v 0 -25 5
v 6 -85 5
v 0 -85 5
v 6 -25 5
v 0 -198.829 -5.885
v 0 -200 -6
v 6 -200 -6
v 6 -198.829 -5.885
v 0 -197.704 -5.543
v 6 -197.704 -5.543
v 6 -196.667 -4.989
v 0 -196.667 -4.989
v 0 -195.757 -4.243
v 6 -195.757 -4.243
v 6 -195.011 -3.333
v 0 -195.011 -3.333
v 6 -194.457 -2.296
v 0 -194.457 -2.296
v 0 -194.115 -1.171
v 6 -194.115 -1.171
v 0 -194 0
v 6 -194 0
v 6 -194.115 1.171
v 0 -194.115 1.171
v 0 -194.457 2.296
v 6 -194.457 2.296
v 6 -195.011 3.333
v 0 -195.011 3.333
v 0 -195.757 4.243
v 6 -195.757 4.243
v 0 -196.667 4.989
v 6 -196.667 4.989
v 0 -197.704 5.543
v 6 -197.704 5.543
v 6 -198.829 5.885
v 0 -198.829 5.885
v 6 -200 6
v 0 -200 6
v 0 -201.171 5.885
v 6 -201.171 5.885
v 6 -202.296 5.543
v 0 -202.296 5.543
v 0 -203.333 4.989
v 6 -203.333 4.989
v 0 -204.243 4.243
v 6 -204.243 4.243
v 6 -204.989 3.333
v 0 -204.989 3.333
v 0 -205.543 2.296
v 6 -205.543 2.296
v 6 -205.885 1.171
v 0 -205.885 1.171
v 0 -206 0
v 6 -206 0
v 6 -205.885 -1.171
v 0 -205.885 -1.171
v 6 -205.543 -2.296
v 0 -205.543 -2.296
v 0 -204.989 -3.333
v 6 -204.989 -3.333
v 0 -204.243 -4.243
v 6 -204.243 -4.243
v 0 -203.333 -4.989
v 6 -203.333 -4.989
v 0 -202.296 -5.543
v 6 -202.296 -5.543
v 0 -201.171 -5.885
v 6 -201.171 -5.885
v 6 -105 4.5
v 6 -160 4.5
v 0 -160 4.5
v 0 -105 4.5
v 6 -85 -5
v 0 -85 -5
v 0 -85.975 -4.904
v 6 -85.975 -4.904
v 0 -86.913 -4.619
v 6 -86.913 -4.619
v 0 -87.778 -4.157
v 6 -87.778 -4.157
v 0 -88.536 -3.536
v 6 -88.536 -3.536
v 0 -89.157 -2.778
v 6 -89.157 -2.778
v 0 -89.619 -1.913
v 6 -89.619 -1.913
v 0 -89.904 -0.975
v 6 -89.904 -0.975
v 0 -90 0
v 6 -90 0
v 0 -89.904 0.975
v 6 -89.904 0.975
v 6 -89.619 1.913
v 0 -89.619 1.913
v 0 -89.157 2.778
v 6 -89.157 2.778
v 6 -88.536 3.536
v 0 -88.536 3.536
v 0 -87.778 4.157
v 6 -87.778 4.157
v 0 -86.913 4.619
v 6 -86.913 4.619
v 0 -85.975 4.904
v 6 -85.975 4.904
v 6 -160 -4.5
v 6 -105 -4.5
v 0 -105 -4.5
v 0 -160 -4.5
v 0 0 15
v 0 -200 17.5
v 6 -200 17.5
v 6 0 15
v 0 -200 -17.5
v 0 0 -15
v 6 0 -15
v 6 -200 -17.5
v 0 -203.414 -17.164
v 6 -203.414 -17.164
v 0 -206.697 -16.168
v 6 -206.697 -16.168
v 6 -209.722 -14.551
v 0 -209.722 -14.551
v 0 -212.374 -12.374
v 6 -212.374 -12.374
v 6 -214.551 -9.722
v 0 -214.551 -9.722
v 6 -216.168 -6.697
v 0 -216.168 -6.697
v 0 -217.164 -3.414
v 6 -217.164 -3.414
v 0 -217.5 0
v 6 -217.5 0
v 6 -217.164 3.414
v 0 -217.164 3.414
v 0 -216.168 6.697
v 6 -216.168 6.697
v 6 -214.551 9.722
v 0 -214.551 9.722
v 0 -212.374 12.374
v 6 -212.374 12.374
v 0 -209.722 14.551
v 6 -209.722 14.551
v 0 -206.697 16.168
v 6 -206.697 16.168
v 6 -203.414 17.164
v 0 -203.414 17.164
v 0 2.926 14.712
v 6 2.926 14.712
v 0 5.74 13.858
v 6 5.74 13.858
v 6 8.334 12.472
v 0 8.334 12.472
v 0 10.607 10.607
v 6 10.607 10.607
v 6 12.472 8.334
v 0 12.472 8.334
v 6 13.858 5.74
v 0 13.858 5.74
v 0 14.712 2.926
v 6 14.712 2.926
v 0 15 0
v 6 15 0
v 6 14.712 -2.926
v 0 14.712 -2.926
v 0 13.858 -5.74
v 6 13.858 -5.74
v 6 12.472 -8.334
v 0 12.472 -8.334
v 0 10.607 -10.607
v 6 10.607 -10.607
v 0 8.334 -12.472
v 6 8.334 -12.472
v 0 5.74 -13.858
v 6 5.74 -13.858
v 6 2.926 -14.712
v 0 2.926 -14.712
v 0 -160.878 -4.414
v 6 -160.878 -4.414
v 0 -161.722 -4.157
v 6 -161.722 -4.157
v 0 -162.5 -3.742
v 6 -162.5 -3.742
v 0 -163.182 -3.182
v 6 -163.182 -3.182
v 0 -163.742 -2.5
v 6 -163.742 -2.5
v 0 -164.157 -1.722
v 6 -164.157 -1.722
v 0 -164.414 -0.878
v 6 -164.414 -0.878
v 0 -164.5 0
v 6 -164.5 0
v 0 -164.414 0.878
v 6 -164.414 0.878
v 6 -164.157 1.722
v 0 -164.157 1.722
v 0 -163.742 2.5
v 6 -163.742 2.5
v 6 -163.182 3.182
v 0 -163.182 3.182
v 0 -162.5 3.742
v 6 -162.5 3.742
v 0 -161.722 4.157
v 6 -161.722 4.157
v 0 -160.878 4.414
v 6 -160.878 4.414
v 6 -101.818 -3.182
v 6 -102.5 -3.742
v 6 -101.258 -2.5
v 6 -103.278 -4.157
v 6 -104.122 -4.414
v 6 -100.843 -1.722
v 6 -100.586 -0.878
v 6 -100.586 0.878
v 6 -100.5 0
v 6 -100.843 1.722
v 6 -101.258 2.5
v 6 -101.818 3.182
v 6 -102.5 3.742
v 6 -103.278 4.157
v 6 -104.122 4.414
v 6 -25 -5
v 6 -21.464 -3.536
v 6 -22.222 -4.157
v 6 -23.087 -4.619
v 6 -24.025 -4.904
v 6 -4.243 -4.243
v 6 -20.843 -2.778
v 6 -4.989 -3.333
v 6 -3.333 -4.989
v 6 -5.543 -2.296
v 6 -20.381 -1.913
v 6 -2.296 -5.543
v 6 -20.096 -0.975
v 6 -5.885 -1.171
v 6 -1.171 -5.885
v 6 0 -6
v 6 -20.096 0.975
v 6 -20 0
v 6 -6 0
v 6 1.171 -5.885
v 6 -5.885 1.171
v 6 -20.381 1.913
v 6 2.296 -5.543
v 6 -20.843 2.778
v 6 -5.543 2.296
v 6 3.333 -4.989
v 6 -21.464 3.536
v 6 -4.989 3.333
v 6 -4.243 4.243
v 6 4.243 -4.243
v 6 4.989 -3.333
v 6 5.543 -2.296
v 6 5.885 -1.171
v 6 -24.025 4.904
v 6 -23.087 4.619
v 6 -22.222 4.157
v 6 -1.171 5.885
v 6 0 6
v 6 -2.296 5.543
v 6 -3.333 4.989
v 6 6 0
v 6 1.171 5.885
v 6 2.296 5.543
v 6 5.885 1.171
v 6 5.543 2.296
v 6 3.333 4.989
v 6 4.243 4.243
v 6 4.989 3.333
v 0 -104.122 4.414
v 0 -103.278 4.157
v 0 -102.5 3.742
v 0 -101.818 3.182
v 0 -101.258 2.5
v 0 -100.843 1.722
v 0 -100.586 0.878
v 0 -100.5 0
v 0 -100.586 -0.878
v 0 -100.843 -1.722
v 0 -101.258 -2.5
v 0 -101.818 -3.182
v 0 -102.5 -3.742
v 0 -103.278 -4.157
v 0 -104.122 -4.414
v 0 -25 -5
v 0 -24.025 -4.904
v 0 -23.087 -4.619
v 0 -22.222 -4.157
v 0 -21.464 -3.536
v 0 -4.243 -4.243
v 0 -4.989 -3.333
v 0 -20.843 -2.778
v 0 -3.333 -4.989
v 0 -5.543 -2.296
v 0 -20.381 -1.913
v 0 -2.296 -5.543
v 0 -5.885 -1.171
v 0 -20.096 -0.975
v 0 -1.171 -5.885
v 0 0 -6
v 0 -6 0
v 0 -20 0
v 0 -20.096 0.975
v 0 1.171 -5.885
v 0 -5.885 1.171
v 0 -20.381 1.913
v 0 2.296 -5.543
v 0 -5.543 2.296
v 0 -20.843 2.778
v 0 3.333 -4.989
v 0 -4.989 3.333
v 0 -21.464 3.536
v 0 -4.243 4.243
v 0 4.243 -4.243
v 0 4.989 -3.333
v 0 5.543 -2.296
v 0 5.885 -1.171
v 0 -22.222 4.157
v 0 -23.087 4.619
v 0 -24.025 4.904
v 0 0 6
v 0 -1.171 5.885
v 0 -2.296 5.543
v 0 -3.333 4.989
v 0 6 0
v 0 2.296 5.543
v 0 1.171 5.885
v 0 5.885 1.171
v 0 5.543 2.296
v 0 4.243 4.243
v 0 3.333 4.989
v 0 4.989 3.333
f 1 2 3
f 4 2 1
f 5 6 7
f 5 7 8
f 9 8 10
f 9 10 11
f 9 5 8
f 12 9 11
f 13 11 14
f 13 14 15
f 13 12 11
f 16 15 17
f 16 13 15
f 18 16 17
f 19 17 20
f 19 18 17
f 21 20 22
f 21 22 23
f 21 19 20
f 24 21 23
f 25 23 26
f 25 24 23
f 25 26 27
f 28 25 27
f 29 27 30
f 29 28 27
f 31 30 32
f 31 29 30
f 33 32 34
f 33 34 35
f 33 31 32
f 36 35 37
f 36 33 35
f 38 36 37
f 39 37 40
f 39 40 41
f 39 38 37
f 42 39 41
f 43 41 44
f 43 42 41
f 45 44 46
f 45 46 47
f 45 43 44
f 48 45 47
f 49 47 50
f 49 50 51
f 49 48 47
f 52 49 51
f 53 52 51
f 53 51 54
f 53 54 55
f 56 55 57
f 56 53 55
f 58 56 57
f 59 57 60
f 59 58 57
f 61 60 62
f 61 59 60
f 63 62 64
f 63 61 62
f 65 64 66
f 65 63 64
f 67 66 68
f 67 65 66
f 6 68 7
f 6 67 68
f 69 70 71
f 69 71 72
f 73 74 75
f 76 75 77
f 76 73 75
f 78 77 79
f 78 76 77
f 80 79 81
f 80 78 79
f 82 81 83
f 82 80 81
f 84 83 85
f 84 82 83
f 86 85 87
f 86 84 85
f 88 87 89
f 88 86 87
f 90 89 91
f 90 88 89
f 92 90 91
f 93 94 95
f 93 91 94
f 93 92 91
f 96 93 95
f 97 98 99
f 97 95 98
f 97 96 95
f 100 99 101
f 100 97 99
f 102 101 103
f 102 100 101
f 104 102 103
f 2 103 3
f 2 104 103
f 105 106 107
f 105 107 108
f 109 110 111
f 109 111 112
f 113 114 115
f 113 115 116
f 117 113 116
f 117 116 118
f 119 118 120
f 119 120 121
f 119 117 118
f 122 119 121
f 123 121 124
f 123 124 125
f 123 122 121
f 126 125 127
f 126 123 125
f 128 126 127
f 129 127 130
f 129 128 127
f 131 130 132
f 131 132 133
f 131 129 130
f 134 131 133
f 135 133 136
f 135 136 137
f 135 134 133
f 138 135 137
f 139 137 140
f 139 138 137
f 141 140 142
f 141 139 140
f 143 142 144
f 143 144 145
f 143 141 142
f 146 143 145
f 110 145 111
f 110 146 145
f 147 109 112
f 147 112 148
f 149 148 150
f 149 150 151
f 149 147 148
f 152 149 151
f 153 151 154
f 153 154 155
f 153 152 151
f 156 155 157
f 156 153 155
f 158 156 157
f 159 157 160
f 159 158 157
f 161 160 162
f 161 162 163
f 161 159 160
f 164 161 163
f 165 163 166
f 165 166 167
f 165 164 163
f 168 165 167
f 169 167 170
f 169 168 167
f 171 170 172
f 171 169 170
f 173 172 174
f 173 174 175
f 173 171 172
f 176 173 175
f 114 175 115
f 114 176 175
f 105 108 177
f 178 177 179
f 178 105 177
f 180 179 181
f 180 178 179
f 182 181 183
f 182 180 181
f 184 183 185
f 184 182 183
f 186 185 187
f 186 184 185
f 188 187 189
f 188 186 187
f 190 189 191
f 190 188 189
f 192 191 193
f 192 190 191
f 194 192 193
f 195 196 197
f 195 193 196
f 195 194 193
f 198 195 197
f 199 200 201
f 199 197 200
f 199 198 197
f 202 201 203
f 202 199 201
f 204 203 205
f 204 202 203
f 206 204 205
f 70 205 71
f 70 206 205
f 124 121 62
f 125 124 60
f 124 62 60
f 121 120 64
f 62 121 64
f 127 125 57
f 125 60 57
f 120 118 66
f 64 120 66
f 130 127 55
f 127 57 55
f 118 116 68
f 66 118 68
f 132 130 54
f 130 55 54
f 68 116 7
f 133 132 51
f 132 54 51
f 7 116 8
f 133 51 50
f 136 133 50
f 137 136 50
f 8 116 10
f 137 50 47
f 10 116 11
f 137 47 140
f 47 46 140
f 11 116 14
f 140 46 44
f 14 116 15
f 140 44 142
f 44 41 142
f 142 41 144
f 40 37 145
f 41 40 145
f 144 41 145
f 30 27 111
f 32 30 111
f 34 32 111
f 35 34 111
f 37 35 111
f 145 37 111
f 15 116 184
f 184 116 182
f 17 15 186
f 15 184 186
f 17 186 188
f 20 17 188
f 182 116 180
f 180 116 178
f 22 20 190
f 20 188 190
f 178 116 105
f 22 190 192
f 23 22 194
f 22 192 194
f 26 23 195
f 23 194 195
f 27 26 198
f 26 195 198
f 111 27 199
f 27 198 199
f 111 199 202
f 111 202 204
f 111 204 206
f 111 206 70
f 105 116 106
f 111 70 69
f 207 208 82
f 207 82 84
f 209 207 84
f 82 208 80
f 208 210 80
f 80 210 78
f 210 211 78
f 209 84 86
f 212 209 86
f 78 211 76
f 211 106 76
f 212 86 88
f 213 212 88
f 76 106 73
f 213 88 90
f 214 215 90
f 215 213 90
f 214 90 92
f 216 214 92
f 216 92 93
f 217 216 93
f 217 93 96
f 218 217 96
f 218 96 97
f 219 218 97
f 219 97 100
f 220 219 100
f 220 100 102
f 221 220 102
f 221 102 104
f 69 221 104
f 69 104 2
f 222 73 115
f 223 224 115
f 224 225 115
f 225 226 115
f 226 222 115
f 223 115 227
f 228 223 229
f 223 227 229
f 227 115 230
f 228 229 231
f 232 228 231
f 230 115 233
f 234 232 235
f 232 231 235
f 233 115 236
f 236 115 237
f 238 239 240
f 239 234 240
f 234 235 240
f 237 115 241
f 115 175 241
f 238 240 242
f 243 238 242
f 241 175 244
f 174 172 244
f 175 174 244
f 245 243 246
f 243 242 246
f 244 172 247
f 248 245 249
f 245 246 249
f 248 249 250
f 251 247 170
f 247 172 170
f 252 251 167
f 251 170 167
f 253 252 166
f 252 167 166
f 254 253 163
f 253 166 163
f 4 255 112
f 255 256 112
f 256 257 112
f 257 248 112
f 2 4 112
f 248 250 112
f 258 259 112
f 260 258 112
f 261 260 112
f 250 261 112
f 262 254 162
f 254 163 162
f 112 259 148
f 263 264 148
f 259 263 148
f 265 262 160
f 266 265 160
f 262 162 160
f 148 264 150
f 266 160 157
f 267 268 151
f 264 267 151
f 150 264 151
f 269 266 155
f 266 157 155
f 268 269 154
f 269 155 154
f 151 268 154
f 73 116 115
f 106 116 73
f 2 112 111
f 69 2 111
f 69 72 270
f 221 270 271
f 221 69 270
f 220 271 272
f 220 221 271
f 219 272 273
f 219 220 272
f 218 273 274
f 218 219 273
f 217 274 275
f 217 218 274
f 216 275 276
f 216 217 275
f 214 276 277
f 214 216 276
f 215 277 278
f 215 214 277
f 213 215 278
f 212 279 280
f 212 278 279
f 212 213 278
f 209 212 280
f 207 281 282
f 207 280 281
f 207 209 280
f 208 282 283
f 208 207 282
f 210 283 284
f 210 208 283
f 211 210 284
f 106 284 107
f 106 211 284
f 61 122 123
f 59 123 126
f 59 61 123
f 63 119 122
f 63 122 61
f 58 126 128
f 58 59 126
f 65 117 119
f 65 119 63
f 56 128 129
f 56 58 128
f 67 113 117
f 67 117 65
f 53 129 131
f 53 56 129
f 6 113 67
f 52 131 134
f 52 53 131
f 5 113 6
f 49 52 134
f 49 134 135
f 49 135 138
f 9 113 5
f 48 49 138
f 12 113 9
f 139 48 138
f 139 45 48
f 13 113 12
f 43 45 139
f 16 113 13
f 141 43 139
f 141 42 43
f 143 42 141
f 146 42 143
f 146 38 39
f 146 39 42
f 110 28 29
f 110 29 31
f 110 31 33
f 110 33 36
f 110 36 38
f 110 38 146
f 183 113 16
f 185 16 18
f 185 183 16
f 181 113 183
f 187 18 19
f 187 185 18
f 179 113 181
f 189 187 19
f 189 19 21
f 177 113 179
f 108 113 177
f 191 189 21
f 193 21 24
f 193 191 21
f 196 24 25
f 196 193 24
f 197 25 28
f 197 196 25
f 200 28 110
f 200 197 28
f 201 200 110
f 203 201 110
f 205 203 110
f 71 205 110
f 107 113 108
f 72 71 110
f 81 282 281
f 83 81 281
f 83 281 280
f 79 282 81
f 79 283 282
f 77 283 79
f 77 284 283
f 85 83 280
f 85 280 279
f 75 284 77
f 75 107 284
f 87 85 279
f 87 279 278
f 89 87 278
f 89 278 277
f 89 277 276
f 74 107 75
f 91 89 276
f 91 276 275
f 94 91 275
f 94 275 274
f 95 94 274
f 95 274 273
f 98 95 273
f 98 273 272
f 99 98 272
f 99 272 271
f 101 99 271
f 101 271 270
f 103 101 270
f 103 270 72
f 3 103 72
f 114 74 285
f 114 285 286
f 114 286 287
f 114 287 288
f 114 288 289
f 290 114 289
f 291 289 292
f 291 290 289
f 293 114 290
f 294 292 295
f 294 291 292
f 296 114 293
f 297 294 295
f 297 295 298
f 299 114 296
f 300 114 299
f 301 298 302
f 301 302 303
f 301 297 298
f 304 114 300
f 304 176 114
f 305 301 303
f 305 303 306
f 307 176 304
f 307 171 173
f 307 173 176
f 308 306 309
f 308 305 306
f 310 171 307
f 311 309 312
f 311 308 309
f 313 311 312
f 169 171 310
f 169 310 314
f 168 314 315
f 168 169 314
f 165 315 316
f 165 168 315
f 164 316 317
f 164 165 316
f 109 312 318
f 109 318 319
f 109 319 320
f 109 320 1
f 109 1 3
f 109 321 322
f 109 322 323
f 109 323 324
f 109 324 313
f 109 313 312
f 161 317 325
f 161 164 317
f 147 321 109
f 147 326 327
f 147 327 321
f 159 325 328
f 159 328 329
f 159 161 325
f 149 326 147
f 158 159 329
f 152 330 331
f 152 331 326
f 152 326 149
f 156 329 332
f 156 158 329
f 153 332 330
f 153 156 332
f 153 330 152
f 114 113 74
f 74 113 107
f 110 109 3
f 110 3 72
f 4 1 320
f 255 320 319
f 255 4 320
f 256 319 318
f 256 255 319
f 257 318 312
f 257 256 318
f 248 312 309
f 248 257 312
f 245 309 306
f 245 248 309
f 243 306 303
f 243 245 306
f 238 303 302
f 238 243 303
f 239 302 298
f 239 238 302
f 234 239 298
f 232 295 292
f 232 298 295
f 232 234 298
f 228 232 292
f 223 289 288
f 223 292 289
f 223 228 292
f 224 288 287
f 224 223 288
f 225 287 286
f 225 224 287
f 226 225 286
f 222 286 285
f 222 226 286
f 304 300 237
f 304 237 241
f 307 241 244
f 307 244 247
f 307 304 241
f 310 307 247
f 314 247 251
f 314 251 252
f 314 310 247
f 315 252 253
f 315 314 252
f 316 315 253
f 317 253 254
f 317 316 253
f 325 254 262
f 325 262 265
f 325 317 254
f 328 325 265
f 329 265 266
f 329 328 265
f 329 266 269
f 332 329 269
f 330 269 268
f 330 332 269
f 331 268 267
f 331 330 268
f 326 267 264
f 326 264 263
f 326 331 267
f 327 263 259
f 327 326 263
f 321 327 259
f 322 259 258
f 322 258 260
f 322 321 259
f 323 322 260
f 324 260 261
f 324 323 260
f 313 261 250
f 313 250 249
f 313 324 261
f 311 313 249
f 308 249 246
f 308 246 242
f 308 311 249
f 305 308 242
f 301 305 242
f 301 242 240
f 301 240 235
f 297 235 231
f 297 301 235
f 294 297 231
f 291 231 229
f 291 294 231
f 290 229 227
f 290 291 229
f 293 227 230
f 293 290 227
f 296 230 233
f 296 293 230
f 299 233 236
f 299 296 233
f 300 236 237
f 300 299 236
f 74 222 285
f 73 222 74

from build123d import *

# Parameters (mm, degrees)
SKETCH_1_R          = 6
EXTRUDE_1_DEPTH     = 6
CUT_EXTRUDE_1_DEPTH = 10


with BuildPart() as part:
    # 草图1 → 凸台-拉伸1 (new body)
    with BuildSketch(Plane(origin=(0, 0, 0), x_dir=(0, 0, -1), z_dir=(1, 0, 0))):
        with BuildLine():
            Line((15, 0), (17.5, -200))
            ThreePointArc((17.5, -200), (0, -217.5), (-17.5, -200))
            Line((-17.5, -200), (-15, 0))
            ThreePointArc((-15, 0), (0, 15), (15, 0))
        make_face()
        Circle(SKETCH_1_R, mode=Mode.SUBTRACT)
        with Locations((0, -200)):
            Circle(SKETCH_1_R, mode=Mode.SUBTRACT)
    extrude(amount=EXTRUDE_1_DEPTH)

    # 草图2 → 切除-拉伸1 (cut)
    with BuildSketch(Plane(origin=(6, 0, 0), x_dir=(0, 0, -1), z_dir=(1, 0, 0))):
        with BuildLine():
            Line((5, -25), (5, -85))
            ThreePointArc((5, -85), (0, -90), (-5, -85))
            Line((-5, -85), (-5, -25))
            ThreePointArc((-5, -25), (0, -20), (5, -25))
        make_face()
        with BuildLine():
            Line((4.5, -105), (4.5, -160))
            ThreePointArc((4.5, -160), (0, -164.5), (-4.5, -160))
            Line((-4.5, -160), (-4.5, -105))
            ThreePointArc((-4.5, -105), (0, -100.5), (4.5, -105))
        make_face()
    extrude(amount=-CUT_EXTRUDE_1_DEPTH, mode=Mode.SUBTRACT)


solid = part.part
